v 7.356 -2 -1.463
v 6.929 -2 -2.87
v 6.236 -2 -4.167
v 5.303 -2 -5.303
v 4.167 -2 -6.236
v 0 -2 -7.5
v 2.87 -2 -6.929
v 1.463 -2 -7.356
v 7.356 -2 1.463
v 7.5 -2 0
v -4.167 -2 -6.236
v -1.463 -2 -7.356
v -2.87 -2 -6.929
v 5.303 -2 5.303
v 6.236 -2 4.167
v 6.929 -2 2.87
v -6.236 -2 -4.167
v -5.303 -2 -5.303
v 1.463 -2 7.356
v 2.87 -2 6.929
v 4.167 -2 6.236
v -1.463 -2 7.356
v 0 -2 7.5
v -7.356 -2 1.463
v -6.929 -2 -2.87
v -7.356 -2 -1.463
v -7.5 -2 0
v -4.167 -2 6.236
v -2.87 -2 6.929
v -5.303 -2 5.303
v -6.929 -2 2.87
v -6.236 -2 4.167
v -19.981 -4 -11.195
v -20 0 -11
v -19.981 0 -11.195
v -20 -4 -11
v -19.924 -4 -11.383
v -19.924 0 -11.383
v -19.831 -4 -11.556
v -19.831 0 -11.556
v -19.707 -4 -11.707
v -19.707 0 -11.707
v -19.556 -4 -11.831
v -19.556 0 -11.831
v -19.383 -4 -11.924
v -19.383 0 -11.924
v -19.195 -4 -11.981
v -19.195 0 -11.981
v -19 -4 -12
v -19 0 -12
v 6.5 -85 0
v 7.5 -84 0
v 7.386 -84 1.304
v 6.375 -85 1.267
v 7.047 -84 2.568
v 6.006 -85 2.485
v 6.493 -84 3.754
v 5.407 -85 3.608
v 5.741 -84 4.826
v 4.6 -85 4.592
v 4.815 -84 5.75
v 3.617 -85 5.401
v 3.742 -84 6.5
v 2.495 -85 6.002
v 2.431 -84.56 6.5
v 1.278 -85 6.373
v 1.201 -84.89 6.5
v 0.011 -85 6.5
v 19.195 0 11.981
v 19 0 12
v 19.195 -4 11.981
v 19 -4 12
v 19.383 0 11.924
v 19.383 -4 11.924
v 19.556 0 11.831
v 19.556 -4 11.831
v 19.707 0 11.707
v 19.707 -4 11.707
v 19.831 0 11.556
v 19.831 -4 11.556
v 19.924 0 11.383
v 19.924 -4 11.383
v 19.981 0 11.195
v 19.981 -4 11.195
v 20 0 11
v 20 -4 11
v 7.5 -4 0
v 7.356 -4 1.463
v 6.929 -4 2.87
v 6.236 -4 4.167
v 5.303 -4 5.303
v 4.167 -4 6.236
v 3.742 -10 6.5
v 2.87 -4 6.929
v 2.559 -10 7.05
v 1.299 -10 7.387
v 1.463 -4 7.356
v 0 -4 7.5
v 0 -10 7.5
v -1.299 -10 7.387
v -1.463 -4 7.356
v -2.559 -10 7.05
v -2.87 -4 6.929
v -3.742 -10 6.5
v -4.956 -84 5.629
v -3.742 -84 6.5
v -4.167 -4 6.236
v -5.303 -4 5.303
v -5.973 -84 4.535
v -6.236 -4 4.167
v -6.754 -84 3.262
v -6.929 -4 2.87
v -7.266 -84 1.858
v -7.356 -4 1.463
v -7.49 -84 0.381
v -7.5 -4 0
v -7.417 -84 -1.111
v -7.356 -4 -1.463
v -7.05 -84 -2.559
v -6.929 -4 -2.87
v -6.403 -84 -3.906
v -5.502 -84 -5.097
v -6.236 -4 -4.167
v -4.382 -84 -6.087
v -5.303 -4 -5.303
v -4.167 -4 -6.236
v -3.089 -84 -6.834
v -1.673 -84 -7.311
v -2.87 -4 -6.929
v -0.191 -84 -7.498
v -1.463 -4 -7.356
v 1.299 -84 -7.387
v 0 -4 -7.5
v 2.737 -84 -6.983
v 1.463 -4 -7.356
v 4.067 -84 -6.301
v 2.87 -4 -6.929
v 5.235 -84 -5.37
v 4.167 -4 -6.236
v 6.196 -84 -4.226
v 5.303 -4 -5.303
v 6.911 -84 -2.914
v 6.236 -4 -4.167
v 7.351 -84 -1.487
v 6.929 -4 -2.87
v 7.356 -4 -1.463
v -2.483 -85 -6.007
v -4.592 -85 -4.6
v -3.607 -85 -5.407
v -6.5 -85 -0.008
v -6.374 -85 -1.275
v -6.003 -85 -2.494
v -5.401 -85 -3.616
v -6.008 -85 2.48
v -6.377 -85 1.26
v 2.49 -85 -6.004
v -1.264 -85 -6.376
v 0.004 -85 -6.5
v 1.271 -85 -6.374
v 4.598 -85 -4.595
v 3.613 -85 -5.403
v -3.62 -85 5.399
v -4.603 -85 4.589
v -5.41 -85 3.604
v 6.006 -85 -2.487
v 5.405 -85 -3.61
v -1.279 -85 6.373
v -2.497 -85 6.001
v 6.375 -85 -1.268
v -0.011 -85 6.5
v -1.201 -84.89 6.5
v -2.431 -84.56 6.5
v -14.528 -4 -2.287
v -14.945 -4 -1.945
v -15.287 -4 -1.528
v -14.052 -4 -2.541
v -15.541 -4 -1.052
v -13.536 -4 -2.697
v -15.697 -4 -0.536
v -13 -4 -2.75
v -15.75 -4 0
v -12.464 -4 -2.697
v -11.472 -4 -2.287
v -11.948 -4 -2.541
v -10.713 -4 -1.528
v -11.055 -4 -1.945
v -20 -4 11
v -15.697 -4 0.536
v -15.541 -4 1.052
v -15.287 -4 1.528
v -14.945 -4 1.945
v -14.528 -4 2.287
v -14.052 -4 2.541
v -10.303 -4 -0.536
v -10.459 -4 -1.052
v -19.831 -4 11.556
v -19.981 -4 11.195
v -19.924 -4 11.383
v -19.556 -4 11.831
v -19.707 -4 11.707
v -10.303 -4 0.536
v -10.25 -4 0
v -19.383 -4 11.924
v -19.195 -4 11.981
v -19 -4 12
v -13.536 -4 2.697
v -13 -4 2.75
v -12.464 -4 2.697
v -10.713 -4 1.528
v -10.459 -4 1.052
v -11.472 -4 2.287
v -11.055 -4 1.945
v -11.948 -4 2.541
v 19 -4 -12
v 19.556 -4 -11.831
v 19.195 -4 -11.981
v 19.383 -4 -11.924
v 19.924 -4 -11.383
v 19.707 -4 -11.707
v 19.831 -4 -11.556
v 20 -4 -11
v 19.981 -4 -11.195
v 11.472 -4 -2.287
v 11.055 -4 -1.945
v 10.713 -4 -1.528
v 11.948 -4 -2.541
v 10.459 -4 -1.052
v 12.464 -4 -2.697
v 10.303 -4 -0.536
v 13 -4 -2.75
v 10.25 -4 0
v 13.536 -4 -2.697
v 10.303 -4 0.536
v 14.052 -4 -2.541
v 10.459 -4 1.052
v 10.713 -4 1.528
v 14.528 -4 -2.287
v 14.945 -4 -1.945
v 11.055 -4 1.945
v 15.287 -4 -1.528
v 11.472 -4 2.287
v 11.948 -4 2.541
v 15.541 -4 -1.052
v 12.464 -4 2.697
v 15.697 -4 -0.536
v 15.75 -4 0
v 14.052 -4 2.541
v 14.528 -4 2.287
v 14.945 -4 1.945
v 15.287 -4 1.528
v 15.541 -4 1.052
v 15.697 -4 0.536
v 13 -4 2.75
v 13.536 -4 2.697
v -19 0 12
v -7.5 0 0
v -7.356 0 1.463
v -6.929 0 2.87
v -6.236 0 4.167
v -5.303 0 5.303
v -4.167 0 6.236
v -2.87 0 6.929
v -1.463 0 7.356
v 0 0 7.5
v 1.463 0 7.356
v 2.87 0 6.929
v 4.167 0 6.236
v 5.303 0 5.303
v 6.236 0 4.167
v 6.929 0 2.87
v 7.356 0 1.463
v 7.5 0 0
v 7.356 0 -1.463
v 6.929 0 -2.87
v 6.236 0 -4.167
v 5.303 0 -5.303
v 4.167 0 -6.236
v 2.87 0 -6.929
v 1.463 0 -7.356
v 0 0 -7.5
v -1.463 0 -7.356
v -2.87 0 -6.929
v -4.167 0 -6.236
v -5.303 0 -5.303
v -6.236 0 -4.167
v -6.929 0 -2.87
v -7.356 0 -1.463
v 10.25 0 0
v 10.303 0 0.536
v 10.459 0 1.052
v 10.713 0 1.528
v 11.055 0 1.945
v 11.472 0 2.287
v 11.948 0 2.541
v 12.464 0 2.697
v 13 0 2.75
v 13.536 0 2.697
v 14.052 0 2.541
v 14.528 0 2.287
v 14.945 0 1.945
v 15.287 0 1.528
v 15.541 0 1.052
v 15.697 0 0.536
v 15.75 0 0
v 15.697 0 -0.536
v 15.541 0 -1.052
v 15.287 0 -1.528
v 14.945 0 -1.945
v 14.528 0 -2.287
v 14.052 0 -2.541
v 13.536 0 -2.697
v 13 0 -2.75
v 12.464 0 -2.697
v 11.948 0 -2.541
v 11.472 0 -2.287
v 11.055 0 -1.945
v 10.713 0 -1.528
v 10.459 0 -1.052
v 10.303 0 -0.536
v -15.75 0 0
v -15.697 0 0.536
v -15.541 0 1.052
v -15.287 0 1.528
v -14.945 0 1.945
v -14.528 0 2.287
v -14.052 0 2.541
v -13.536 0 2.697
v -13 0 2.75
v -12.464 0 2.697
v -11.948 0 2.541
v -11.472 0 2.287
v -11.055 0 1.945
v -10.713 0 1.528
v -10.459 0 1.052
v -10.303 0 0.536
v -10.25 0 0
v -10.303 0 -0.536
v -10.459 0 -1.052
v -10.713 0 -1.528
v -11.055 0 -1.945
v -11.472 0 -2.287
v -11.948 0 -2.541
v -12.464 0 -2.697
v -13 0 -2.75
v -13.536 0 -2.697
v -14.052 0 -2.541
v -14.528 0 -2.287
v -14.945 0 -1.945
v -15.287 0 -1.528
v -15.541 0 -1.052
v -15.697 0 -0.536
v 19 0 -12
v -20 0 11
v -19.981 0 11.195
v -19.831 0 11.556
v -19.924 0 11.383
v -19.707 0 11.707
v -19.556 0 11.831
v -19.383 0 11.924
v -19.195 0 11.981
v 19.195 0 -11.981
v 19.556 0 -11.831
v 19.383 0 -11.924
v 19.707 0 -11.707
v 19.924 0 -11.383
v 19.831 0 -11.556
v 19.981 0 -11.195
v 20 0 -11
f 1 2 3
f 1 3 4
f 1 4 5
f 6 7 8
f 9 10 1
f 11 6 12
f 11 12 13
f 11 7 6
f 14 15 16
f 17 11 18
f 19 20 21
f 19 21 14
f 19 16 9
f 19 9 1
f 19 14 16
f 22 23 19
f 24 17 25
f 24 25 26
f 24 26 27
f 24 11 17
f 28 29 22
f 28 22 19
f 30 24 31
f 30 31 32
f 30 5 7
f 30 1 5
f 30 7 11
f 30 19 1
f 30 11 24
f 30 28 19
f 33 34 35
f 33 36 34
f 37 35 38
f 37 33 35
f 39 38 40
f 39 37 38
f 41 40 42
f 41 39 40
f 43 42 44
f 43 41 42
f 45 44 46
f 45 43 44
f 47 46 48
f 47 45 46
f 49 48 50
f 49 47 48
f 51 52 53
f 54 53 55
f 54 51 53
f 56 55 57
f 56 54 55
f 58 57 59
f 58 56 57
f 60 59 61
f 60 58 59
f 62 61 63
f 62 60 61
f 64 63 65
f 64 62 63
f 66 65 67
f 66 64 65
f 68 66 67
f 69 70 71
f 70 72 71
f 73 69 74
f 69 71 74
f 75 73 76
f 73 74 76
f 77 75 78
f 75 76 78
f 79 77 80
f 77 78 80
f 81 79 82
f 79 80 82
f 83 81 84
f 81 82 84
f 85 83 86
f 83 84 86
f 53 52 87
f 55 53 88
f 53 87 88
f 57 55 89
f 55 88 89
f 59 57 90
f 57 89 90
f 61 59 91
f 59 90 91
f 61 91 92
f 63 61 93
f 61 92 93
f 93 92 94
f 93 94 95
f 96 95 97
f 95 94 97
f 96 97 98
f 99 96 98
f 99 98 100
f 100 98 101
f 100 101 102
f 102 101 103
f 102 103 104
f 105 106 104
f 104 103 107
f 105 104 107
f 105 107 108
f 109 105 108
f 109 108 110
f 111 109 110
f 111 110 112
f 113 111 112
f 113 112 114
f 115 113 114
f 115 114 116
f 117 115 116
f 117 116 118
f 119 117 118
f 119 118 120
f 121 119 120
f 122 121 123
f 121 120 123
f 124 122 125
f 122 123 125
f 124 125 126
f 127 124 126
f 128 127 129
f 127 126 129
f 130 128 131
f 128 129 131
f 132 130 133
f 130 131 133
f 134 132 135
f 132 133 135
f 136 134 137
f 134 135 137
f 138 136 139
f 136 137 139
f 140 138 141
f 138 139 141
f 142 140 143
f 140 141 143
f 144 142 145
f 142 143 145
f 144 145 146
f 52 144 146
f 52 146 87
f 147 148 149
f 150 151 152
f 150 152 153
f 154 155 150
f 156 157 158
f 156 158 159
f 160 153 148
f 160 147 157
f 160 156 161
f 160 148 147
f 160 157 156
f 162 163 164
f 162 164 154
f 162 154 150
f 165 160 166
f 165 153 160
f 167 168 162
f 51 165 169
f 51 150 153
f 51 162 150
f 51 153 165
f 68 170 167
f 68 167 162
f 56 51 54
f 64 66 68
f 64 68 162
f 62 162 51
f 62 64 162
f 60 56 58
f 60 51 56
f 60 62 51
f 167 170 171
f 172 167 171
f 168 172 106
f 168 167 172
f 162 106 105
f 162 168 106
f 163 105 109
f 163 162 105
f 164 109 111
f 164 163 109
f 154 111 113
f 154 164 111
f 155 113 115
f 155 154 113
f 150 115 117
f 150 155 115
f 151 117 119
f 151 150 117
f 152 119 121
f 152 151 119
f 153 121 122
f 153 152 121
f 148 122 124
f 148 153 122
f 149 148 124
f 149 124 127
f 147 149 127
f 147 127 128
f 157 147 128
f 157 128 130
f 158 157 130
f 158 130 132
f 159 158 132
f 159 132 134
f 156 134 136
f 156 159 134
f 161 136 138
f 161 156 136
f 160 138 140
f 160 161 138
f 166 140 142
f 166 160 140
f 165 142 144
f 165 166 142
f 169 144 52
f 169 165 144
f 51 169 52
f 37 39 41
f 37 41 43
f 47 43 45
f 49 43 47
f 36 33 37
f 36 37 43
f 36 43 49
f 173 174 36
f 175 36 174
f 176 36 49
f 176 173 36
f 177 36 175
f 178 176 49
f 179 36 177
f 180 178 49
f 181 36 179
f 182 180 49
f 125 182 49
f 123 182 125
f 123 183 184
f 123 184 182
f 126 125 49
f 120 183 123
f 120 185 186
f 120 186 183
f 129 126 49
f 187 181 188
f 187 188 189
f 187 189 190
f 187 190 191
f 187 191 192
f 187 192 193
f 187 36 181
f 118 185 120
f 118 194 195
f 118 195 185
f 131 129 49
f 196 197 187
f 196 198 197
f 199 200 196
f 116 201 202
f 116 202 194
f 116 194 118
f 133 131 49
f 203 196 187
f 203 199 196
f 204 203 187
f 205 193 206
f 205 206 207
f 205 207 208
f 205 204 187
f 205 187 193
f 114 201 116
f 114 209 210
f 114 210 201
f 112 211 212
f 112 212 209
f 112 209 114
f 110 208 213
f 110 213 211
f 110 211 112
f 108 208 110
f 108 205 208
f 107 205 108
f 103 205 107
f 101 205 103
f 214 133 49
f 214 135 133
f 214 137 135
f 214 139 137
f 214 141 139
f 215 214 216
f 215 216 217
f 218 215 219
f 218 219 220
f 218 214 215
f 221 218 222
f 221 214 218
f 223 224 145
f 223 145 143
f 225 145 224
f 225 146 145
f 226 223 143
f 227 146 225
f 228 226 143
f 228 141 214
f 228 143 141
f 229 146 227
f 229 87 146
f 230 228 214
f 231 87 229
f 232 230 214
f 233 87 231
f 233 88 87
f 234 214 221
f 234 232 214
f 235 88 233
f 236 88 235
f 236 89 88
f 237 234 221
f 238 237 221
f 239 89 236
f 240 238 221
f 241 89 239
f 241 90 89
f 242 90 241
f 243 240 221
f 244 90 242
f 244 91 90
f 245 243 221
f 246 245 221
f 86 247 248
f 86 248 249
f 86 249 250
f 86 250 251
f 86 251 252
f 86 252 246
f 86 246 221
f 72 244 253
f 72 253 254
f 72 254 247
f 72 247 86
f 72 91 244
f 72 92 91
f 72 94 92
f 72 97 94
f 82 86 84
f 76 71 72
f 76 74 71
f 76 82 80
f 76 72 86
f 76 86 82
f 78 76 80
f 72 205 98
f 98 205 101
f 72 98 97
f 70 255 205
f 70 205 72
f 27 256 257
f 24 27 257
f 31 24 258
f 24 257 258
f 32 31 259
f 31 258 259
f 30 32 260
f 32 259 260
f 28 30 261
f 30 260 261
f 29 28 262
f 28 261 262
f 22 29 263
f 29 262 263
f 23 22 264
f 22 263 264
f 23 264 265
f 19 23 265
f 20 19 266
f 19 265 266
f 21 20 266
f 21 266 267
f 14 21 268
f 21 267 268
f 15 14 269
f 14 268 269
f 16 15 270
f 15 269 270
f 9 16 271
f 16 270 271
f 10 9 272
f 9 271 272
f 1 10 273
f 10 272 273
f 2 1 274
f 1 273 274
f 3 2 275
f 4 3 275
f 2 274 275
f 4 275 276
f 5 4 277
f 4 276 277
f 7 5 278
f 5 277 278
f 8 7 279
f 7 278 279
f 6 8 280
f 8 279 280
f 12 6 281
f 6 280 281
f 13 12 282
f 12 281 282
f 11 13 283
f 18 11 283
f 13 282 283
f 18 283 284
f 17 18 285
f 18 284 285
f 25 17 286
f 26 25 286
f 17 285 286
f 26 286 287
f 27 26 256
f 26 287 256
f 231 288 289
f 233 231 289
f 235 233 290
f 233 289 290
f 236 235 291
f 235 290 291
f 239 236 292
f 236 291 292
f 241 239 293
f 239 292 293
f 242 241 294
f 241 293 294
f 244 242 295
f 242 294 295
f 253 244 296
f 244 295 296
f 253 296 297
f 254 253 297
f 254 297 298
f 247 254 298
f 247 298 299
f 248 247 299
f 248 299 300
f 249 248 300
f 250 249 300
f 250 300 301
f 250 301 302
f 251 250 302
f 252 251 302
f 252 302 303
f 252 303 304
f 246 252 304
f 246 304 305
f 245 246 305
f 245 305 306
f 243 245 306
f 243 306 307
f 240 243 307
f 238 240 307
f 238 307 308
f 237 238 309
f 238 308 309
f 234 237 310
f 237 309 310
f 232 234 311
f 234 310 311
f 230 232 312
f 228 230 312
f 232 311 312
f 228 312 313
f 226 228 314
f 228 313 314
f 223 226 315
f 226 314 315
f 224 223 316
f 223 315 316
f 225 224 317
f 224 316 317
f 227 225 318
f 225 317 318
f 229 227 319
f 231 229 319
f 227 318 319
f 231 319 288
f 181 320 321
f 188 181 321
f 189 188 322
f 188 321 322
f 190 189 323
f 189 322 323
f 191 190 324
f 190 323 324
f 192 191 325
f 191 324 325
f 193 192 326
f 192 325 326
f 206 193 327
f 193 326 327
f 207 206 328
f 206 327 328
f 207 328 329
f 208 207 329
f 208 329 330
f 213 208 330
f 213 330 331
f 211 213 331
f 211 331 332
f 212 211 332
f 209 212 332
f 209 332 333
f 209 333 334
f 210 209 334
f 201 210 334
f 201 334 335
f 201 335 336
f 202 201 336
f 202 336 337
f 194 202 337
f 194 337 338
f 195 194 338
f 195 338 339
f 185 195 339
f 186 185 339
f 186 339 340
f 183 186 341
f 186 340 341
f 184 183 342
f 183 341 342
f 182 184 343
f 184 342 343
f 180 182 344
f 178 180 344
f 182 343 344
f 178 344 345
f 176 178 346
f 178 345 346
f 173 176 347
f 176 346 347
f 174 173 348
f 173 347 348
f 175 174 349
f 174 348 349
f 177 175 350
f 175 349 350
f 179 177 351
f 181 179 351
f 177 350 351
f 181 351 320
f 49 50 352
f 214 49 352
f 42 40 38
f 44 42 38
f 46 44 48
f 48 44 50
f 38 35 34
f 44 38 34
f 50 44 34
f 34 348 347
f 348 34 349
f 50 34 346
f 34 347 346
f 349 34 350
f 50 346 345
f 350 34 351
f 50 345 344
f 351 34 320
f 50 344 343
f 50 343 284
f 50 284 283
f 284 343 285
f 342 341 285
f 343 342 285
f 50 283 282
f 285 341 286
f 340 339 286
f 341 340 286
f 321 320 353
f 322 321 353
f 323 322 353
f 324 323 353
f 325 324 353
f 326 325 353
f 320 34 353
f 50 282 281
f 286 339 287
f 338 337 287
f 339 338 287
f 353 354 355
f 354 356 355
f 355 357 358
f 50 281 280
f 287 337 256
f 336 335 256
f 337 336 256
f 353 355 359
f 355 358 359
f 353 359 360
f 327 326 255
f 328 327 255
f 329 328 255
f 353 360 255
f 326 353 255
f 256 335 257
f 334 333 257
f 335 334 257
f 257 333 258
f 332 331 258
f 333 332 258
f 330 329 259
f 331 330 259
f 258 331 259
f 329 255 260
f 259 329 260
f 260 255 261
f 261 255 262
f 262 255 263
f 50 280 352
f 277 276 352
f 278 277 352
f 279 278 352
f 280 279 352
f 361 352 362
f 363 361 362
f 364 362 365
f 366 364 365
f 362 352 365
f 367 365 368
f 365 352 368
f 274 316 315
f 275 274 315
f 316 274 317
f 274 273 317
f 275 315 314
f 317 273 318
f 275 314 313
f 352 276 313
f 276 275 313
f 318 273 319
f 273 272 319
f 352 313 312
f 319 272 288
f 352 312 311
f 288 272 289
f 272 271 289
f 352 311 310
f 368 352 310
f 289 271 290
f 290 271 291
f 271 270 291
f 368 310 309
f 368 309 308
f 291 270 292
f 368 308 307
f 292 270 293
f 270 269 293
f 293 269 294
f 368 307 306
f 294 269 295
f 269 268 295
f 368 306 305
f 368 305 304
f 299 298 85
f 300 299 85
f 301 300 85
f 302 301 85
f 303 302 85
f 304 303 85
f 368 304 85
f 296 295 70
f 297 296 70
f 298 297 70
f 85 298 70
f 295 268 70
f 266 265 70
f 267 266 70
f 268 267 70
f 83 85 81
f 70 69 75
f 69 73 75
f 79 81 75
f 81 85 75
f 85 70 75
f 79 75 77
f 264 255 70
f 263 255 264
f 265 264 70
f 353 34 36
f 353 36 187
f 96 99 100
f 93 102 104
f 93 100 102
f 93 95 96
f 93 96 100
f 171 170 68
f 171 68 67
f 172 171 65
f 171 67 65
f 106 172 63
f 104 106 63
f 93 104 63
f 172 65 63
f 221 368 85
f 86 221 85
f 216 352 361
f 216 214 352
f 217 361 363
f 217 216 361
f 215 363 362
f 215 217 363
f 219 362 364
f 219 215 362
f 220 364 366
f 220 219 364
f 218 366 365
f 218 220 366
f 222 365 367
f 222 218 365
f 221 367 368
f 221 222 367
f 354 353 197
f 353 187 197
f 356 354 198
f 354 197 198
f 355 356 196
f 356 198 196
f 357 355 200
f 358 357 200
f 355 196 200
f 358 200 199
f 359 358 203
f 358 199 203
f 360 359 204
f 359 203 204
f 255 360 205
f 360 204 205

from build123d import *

# Parameters (mm, degrees)
F0_W      = 40
F0_H      = 24
F0_R      = 7.5
F1_DEPTH  = 4
F2_DEPTH  = 85
F4_D      = 5.5
F6_DEPTH  = 75
F7_R      = 1
F8_SIZE2  = 0.99999
F8_SIZE   = 0.99999
F9_R      = 7.5
F10_DEPTH = 2


# Not quite as in the source:
# - a fillet or chamfer is up to 0.001 mm smaller than in the source, because OpenCascade refuses the exact size


with BuildPart() as f1:
    # F0 (on Front) → F1 (new body)
    with BuildSketch(Plane.XZ):
        Rectangle(F0_W, F0_H)
        Circle(F0_R, mode=Mode.SUBTRACT)
    extrude(amount=F1_DEPTH)

    # F0 (on Front) → F2 (join)
    with BuildSketch(Plane.XZ):
        Circle(F0_R)
    extrude(amount=F2_DEPTH)

    # F4 (through all)
    with Locations(Plane.XZ.offset(4)):
        with Locations((-13, 0), (13, 0)):
            Hole(F4_D / 2)

    # F5 (on face) → F6 (cut)
    with BuildSketch(Plane.XZ.offset(85)):
        with BuildLine():
            Line((8.4905531257, 12.6322833821), (-12.126554407, 6.5))
            Line((-12.126554407, 6.5), (-3.7416573868, 6.5))
            ThreePointArc((-3.7416573868, 6.5), (0, 7.5), (3.7416573868, 6.5))
            Line((3.7416573868, 6.5), (18.1320688201, 6.5))
            Line((18.1320688201, 6.5), (8.4905531257, 12.6322833821))
        make_face()
        with BuildLine():
            ThreePointArc((3.7416573868, 6.5), (0, 7.5), (-3.7416573868, 6.5))
            Line((-3.7416573868, 6.5), (3.7416573868, 6.5))
        make_face()
    extrude(amount=-F6_DEPTH, mode=Mode.SUBTRACT)

    # F7
    f7_edges = [f1.edges().sort_by_distance(p)[0] for p in [
        (-20, -2, 12),
        (20, -2, 12),
        (20, -2, -12),
        (-20, -2, -12),
    ]]
    fillet(f7_edges, radius=F7_R)

    # F8 (size 1 and 1 in the source; OpenCascade refuses exactly that, so slightly less here)
    f8_edges = [f1.edges().sort_by_distance(p)[0] for p in [
        (-3.754169, -85, -6.492782),
        (6.492782, -85, 3.754169),
    ]]
    chamfer(f8_edges, length=F8_SIZE, length2=F8_SIZE2)

    # F9 (on face) → F10 (cut)
    with BuildSketch(Plane(origin=(0, 0, 0), x_dir=(-1, 0, 0), z_dir=(0, 1, 0))):
        Circle(F9_R)
    extrude(amount=-F10_DEPTH, mode=Mode.SUBTRACT)


solid = f1.part
